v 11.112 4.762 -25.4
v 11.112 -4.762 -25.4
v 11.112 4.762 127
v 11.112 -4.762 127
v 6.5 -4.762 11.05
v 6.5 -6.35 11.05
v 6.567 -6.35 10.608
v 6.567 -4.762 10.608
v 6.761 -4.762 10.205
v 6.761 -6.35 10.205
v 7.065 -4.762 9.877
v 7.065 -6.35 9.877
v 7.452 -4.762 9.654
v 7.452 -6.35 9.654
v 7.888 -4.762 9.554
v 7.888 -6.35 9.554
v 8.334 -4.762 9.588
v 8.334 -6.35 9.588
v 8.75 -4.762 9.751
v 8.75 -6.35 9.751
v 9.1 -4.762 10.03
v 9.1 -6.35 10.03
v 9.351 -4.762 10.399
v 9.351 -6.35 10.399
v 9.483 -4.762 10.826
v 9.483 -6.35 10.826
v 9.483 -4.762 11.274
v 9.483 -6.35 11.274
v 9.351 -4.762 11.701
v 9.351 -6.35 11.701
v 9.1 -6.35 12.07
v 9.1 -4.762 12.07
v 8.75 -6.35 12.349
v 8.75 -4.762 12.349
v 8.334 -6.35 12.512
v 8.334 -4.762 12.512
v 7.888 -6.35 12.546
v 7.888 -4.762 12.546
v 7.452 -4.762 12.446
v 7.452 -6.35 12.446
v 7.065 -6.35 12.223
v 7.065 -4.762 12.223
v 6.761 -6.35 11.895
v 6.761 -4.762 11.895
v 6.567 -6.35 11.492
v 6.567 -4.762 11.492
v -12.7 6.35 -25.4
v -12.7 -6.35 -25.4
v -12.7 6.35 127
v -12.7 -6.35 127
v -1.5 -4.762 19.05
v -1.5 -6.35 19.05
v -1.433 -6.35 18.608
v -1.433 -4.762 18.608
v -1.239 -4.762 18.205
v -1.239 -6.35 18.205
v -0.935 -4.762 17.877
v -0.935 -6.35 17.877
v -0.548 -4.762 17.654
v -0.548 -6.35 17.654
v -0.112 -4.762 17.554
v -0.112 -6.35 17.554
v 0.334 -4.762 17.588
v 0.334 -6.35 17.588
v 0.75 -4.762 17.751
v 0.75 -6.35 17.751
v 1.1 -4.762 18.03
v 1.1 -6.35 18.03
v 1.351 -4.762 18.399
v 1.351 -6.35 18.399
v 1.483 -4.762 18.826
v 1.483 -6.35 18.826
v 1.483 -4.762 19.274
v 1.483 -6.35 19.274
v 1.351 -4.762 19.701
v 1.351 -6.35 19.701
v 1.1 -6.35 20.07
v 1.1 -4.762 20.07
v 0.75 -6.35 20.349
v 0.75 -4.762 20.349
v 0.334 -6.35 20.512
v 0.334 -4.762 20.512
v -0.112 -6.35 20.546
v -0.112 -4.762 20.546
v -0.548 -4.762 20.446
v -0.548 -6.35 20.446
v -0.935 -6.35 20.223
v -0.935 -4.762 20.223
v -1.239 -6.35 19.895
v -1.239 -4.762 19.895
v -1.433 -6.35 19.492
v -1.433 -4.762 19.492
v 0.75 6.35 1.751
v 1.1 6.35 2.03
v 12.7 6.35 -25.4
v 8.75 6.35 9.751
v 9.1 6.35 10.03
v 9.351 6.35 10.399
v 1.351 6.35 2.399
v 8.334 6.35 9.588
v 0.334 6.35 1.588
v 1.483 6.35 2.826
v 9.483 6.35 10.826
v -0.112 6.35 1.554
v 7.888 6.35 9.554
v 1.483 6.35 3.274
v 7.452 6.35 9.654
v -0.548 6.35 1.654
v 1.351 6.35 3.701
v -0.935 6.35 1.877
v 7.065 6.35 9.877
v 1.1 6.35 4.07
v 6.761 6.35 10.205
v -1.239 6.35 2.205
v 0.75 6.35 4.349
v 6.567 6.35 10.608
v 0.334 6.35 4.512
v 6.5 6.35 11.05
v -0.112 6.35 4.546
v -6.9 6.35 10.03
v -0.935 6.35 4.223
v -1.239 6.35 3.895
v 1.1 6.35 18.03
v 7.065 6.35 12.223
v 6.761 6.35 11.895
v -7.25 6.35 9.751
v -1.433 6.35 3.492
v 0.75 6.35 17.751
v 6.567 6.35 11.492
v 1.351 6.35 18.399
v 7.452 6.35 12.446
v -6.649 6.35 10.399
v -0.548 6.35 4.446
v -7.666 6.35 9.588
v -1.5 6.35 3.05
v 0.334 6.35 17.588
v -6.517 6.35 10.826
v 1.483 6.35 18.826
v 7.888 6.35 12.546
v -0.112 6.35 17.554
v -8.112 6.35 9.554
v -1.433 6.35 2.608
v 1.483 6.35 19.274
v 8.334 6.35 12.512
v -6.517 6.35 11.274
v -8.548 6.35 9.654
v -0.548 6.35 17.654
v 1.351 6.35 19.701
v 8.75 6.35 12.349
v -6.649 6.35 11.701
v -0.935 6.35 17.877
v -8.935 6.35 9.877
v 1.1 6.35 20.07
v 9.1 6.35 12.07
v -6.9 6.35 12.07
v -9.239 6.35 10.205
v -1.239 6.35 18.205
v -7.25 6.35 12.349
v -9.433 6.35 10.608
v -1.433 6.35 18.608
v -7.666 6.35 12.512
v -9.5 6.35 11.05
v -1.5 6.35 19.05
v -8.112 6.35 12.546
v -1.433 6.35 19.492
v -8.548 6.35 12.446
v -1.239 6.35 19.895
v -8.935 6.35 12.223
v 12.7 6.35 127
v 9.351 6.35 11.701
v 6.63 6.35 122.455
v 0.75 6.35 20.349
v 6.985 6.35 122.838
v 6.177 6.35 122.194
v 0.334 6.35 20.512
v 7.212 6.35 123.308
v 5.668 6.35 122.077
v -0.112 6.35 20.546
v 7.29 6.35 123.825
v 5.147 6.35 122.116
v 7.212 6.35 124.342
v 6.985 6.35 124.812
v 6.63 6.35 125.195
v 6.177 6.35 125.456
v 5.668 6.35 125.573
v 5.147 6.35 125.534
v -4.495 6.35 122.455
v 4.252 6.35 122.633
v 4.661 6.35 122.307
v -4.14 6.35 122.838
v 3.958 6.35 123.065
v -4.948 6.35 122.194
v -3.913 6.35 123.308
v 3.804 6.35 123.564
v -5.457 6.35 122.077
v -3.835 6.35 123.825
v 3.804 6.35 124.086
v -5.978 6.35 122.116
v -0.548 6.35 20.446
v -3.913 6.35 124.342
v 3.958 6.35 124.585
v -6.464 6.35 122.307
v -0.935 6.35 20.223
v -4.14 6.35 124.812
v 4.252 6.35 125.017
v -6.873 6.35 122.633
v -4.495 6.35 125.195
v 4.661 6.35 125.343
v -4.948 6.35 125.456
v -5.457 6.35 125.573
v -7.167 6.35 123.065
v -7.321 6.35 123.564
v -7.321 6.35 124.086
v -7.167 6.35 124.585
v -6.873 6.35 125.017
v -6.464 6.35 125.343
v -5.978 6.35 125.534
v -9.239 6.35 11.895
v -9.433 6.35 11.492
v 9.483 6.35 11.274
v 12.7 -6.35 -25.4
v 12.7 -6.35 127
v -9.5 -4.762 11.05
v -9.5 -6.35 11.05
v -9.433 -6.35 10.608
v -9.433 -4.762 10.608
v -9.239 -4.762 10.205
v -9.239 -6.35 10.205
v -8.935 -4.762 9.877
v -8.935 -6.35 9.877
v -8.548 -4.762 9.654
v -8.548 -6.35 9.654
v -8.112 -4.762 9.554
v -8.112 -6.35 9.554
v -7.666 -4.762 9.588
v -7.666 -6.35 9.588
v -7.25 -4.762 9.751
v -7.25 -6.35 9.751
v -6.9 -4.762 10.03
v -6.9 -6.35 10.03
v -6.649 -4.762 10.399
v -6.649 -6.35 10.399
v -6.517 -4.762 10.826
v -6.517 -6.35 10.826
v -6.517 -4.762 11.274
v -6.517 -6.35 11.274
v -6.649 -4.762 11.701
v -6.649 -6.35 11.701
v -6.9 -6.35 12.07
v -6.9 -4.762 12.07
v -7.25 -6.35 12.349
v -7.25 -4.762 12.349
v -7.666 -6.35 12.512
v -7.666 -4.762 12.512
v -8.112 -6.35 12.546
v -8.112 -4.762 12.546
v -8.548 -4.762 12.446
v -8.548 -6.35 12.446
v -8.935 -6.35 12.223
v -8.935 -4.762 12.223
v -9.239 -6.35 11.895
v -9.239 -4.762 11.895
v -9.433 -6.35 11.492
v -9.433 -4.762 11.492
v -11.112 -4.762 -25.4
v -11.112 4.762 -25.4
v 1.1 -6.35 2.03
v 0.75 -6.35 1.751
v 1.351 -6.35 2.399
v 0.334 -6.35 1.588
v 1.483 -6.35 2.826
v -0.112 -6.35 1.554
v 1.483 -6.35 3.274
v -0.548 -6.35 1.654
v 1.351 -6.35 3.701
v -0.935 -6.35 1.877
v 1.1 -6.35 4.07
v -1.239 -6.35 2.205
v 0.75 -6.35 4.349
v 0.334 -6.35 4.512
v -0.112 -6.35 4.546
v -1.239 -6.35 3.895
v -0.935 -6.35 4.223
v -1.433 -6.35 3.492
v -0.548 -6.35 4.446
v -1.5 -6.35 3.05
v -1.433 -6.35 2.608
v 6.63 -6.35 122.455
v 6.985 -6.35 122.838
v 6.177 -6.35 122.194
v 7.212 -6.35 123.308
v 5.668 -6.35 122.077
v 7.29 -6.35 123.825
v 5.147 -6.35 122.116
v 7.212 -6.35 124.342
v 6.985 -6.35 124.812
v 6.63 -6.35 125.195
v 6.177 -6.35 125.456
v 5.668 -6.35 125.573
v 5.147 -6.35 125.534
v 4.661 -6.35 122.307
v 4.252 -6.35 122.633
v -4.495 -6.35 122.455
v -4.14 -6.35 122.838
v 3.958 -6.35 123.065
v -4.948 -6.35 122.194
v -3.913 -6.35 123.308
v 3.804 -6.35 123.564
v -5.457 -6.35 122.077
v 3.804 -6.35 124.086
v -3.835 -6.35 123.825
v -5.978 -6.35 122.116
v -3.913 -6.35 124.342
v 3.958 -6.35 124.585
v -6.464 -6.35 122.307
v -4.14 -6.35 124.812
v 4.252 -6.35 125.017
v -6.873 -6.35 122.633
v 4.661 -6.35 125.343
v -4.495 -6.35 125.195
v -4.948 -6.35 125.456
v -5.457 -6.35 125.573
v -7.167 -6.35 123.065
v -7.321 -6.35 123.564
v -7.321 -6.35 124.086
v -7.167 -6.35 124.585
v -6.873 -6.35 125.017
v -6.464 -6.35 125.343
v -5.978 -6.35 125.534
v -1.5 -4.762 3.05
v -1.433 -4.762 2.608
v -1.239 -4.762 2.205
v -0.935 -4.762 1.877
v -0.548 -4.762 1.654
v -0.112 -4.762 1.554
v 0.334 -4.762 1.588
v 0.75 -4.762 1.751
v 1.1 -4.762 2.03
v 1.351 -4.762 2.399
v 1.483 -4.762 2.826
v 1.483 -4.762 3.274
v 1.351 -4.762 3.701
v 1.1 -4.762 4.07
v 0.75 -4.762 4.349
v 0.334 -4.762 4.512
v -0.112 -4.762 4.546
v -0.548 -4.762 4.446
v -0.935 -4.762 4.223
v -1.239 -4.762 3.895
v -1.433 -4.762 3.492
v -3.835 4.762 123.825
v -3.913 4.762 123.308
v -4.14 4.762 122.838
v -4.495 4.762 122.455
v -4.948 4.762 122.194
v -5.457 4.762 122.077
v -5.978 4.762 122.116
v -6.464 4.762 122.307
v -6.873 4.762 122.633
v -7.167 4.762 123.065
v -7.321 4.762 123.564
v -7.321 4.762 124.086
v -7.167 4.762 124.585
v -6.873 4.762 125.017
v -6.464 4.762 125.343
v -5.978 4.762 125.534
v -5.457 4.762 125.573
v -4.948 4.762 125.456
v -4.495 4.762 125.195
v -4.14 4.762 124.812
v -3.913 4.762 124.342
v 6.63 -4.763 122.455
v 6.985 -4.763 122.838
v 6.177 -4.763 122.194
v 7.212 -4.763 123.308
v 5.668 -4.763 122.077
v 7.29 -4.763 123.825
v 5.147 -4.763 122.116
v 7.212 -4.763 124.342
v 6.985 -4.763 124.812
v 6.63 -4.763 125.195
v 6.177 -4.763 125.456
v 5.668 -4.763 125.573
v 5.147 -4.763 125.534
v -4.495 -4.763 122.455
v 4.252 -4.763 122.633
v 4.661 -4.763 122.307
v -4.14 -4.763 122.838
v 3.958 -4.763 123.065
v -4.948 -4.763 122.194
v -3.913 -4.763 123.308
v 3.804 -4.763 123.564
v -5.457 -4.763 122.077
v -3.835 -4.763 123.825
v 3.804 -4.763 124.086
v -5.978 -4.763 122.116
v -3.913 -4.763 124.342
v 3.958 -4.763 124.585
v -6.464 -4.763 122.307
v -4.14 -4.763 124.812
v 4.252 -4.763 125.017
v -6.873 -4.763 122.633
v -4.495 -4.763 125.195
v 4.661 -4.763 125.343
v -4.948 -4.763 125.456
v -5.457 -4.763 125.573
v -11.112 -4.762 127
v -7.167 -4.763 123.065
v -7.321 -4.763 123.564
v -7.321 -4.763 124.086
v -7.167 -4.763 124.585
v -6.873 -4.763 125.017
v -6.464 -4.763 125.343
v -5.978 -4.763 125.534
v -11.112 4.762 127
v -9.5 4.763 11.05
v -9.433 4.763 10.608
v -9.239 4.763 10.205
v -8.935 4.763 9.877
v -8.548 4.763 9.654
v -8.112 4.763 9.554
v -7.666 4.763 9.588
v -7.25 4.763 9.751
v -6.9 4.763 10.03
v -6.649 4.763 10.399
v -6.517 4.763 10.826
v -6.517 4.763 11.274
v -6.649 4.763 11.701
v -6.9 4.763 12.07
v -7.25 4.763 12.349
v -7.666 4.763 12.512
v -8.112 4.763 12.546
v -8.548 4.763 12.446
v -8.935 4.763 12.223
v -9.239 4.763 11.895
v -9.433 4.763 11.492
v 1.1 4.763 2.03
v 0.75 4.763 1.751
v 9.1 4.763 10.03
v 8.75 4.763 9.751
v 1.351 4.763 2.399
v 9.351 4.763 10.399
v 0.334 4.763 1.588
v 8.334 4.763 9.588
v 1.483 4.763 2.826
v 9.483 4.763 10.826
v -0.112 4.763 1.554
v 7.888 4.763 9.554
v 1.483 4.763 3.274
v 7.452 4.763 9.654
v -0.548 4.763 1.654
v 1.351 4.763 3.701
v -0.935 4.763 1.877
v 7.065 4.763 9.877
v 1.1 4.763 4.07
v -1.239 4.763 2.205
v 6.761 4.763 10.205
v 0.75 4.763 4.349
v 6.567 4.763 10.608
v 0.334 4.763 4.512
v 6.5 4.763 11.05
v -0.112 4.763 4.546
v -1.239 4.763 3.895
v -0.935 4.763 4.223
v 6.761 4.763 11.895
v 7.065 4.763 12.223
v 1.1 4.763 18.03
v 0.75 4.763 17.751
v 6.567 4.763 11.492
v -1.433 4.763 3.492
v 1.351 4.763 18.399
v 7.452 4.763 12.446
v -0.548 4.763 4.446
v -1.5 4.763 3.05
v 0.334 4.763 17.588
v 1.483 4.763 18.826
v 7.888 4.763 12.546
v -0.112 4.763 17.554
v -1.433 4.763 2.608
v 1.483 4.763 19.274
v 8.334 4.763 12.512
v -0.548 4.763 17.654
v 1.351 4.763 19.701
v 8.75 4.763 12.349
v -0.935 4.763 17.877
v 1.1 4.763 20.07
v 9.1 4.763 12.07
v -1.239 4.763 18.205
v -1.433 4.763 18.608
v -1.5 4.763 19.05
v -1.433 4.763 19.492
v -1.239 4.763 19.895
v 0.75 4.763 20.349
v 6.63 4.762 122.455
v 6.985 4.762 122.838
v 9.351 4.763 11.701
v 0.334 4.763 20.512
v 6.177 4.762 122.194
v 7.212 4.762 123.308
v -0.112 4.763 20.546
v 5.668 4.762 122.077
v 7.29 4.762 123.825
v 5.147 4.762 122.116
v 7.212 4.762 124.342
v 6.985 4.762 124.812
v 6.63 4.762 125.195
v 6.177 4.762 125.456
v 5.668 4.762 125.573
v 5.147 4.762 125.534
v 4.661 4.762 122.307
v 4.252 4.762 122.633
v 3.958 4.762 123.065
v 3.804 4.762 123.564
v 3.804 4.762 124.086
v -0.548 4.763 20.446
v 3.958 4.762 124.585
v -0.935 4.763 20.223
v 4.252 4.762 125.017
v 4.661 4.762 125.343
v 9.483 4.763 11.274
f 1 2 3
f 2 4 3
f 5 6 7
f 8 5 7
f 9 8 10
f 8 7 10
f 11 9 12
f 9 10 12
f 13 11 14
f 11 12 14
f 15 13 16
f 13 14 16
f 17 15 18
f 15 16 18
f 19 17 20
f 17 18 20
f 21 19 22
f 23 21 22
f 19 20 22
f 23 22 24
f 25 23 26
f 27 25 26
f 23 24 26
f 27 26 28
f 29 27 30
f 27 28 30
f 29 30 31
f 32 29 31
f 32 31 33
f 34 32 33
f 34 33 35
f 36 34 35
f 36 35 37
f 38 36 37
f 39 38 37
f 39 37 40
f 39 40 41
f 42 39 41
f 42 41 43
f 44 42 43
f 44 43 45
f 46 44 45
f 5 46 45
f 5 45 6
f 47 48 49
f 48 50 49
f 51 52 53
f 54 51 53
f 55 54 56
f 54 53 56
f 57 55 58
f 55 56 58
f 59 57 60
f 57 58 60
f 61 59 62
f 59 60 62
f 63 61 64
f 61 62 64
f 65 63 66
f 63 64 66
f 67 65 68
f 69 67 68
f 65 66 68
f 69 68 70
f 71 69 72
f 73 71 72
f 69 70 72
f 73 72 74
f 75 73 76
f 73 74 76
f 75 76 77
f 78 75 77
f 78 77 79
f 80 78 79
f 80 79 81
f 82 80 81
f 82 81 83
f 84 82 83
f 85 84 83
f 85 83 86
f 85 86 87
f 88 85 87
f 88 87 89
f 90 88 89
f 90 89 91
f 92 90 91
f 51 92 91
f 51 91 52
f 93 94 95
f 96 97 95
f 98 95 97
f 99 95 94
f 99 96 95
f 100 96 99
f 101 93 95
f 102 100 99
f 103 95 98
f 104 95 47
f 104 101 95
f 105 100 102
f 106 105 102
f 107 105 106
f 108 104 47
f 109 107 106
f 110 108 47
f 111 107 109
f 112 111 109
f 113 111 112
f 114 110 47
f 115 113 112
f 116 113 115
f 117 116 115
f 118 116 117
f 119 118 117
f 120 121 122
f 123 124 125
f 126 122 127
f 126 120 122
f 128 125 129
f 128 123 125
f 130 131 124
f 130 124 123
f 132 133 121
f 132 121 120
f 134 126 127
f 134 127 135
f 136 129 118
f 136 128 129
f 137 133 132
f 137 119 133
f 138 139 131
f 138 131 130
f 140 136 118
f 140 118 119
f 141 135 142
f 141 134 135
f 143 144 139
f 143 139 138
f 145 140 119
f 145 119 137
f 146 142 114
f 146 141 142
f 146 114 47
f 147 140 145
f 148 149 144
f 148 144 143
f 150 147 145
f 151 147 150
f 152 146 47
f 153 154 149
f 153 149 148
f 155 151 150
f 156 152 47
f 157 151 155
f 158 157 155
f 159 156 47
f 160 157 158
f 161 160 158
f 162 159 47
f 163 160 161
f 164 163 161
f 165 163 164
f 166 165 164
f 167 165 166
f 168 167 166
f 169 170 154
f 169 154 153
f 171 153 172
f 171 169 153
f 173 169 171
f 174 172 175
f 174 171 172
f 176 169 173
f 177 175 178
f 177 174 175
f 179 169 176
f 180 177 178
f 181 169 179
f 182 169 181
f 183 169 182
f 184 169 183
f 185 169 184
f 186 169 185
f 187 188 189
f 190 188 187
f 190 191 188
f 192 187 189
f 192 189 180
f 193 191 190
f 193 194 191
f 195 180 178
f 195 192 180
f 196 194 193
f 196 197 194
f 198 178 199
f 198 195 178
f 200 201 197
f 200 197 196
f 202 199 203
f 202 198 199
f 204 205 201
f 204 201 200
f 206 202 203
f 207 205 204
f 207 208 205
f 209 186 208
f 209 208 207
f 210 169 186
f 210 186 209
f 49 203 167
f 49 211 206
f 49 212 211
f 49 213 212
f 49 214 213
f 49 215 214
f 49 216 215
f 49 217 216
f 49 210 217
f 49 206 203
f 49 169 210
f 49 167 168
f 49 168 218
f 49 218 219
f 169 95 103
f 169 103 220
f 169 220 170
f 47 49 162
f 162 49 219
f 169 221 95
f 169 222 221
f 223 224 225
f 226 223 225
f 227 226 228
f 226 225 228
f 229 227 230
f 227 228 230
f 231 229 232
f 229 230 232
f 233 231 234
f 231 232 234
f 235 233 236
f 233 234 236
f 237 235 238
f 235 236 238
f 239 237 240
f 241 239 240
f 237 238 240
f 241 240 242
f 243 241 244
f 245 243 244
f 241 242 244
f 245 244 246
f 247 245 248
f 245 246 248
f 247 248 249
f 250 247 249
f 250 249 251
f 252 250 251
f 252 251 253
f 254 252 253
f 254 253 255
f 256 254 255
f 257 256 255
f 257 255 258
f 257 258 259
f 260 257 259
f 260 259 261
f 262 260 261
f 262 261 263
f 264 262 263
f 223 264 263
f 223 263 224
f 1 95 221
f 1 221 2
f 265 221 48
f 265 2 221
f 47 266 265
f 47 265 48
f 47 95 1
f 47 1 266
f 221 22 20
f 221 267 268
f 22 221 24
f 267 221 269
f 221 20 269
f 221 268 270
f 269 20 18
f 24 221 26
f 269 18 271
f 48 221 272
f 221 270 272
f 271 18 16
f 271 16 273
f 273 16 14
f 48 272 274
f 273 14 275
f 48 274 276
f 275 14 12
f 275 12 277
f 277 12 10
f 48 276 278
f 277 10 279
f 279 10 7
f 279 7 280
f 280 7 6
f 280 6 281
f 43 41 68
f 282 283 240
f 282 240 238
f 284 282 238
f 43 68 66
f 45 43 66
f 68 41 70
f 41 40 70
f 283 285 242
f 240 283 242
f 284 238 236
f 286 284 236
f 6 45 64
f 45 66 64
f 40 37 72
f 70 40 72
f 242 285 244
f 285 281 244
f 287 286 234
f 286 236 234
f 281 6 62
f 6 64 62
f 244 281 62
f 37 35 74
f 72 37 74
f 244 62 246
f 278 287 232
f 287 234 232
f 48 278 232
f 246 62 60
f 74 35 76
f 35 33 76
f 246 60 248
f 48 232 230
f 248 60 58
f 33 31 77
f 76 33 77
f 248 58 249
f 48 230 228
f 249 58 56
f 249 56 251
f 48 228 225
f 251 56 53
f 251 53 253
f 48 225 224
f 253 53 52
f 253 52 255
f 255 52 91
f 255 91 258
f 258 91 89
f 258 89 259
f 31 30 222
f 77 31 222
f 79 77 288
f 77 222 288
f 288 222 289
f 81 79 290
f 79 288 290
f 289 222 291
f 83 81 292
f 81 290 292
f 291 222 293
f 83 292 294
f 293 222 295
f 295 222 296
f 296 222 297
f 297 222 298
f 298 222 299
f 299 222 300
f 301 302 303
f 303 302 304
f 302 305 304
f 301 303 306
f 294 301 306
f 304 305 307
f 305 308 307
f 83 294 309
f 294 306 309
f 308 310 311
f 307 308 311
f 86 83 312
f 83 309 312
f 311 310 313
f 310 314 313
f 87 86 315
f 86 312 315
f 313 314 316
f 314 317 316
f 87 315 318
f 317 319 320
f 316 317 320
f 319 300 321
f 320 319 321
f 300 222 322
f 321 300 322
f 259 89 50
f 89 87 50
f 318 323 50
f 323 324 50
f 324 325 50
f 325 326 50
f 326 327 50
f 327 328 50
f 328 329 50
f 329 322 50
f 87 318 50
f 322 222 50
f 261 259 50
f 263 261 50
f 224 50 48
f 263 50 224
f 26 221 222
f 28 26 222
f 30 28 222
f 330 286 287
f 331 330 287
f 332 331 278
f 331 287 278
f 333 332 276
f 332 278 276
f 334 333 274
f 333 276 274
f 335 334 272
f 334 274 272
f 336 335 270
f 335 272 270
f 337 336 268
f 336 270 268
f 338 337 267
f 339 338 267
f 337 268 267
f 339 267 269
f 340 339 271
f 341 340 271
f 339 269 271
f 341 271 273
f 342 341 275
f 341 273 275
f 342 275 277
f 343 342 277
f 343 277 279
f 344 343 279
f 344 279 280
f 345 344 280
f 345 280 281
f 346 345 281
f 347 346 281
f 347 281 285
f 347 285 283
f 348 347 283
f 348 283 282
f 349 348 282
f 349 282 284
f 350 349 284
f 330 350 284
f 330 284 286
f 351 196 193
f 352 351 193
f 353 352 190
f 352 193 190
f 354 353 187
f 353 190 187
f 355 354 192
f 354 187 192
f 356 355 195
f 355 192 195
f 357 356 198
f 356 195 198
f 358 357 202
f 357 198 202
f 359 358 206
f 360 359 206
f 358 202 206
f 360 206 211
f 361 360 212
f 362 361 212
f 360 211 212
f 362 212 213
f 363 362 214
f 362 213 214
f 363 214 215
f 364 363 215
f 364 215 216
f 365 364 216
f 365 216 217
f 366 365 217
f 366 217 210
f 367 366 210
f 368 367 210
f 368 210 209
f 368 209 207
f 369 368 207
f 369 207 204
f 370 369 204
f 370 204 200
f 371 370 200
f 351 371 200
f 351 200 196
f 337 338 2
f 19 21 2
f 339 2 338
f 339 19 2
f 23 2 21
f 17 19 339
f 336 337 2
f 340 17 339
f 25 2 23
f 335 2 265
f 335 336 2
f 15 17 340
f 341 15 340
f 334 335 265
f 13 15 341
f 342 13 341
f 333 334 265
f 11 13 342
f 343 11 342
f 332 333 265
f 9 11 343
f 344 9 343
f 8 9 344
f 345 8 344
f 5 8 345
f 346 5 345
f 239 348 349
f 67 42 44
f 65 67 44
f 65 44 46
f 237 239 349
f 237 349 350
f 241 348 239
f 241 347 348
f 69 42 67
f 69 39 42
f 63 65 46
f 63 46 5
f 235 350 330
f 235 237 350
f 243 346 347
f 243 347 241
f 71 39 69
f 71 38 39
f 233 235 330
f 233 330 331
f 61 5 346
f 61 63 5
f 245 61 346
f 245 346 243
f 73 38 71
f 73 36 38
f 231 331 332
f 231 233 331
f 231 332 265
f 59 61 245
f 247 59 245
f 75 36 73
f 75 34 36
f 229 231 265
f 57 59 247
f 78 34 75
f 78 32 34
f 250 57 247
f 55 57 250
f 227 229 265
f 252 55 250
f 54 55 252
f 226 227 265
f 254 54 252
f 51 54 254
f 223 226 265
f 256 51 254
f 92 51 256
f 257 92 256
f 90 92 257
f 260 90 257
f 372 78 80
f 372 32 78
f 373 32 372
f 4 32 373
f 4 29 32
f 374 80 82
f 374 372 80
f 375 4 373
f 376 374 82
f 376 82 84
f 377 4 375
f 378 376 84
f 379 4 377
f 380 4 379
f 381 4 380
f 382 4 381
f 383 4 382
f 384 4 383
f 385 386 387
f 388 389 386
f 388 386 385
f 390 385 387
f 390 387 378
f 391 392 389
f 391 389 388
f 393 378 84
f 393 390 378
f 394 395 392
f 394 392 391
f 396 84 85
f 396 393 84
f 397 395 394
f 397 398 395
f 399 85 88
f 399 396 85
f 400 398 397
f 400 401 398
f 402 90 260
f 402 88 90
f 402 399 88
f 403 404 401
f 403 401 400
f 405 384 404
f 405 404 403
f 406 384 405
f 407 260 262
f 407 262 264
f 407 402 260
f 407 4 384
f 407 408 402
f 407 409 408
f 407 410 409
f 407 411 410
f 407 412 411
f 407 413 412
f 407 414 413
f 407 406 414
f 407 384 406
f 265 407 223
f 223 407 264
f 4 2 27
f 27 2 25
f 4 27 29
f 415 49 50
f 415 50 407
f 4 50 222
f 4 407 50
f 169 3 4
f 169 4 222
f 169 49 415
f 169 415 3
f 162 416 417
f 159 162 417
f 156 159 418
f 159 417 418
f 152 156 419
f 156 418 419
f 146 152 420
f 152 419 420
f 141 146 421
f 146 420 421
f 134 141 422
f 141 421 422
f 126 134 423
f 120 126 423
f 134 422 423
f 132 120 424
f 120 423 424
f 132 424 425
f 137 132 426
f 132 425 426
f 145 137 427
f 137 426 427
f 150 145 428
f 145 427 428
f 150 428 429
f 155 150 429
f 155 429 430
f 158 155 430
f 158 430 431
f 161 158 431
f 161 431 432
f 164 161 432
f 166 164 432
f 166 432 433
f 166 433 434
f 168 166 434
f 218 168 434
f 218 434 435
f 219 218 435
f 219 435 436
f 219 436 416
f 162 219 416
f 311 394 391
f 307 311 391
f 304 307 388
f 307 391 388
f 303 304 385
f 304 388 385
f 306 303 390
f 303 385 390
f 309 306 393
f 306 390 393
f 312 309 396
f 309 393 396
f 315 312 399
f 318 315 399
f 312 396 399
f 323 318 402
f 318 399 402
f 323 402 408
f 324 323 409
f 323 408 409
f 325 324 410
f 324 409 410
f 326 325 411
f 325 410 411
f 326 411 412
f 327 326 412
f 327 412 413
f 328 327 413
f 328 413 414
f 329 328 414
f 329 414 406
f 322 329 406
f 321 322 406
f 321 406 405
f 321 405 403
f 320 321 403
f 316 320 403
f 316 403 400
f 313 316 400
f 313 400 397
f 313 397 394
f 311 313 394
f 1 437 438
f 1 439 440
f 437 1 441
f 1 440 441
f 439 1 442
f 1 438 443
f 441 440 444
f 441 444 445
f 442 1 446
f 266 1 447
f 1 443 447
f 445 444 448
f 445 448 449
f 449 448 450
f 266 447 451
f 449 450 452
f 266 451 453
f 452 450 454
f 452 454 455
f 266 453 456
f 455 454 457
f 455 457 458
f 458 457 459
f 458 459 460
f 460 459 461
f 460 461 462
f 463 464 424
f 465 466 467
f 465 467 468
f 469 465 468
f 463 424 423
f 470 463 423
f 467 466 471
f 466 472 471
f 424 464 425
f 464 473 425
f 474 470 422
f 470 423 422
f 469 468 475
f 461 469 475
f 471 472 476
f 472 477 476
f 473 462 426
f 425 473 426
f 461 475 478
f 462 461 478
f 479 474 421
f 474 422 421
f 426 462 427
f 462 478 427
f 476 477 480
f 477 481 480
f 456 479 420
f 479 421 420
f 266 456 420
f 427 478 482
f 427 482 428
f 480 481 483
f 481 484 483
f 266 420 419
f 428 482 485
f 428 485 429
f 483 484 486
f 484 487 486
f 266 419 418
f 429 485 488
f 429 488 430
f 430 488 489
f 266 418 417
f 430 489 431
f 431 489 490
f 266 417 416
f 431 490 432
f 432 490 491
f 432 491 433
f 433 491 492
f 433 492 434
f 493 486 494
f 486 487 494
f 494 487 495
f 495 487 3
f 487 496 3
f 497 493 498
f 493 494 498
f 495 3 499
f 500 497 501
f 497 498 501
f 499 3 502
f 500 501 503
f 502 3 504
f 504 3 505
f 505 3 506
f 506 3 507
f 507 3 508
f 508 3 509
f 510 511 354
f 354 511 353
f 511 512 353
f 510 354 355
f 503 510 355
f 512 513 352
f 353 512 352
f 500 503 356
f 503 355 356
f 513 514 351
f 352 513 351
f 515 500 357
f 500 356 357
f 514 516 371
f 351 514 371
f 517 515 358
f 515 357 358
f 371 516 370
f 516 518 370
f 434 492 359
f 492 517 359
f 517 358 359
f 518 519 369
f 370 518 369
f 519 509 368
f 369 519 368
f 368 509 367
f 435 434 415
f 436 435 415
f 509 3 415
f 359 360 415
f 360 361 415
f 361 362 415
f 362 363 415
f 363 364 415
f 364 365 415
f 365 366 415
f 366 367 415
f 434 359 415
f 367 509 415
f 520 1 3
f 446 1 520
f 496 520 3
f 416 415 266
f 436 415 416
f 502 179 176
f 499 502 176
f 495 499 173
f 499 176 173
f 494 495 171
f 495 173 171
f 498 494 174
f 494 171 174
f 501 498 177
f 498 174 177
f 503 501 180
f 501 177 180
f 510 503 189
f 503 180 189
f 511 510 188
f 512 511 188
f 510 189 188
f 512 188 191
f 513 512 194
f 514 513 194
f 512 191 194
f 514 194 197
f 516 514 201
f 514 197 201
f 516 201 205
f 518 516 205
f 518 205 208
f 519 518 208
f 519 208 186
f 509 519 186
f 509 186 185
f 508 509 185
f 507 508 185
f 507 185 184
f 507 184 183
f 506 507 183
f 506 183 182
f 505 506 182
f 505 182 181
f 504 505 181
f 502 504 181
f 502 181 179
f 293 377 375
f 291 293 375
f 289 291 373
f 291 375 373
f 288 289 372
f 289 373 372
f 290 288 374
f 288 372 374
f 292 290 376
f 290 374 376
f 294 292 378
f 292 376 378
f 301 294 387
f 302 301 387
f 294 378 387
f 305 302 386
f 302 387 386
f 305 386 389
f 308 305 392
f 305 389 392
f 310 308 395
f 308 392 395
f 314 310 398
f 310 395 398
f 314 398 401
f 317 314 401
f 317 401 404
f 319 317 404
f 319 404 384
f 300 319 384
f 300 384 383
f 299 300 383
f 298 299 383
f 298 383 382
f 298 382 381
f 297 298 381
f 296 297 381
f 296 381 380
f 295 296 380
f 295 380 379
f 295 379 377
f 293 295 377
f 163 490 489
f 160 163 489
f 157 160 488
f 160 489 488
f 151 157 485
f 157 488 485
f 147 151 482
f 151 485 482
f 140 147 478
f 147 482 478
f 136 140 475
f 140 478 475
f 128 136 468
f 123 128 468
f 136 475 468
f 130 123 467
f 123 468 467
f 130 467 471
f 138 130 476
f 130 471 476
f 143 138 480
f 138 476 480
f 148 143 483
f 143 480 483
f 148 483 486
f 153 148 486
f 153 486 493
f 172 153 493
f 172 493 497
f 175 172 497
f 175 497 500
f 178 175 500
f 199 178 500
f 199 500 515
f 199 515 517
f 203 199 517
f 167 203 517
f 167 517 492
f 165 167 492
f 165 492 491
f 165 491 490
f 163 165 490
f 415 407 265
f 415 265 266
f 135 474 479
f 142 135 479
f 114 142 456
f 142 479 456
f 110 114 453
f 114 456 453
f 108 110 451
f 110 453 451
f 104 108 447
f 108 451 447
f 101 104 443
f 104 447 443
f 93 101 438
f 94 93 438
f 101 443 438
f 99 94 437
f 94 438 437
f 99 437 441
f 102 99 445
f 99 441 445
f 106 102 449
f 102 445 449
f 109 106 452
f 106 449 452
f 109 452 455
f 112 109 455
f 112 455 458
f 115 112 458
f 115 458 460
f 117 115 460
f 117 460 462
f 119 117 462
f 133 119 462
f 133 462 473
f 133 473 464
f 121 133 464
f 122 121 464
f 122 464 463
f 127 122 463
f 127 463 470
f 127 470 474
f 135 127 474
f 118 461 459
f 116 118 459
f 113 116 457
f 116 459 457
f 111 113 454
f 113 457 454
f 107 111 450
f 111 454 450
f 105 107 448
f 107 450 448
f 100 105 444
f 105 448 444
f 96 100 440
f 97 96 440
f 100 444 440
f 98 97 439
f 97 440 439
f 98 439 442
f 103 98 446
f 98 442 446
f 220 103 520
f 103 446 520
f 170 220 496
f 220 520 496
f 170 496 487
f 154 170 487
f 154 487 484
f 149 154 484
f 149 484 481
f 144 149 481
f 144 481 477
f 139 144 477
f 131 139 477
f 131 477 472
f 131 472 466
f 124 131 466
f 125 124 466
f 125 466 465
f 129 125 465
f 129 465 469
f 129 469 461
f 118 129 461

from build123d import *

# Parameters (mm, degrees)
SKETCH1_W               = 25.4
SKETCH1_H               = 12.7
BOSS_EXTRUDE1_DEPTH     = 127
SKETCH4_W               = 22.225
SKETCH4_H               = 9.525
CUT_EXTRUDE1_DEPTH      = 128
SKETCH5_R               = 1.7526
CUT_EXTRUDE2_DEPTH      = 1
CUT_EXTRUDE2_DEPTH_BACK = 13.7
SKETCH6_R               = 1.5
CUT_EXTRUDE3_DEPTH      = 1
CUT_EXTRUDE3_DEPTH_BACK = 13.7
SKETCH7_W               = 25.4
SKETCH7_H               = 12.7
SKETCH7_W_2             = 22.225
SKETCH7_H_2             = 9.525
BOSS_EXTRUDE2_DEPTH     = 25.4


with BuildPart() as part:
    # Sketch1 → Boss-Extrude1 (new body)
    with BuildSketch(Plane.XY):
        Rectangle(SKETCH1_W, SKETCH1_H)
    extrude(amount=BOSS_EXTRUDE1_DEPTH)

    # Sketch4 → Cut-Extrude1 (cut, through all)
    with BuildSketch(Plane(origin=(0, 0, 0), x_dir=(-1, 0, 0), z_dir=(0, 0, -1))):
        Rectangle(SKETCH4_W, SKETCH4_H)
    extrude(amount=-CUT_EXTRUDE1_DEPTH, mode=Mode.SUBTRACT)

    # Sketch5 → Cut-Extrude2 (cut, two sides)
    with BuildSketch(Plane(origin=(0, 6.35, 0), x_dir=(1, 0, 0), z_dir=(0, 1, 0))) as cut_extrude2_sk:
        with Locations((-5.588, -123.825)):
            Circle(SKETCH5_R)
        with Locations((5.5372, -123.825)):
            Circle(SKETCH5_R)
    extrude(amount=CUT_EXTRUDE2_DEPTH, mode=Mode.SUBTRACT)
    extrude(cut_extrude2_sk.sketch, amount=-CUT_EXTRUDE2_DEPTH_BACK, mode=Mode.SUBTRACT)

    # Sketch6 → Cut-Extrude3 (cut, two sides)
    with BuildSketch(Plane(origin=(0, -6.35, 0), x_dir=(-1, 0, 0), z_dir=(0, -1, 0))) as cut_extrude3_sk:
        with Locations((8, -11.05)):
            Circle(SKETCH6_R)
        with Locations((-8, -11.05)):
            Circle(SKETCH6_R)
        with Locations((0, -3.05)):
            Circle(SKETCH6_R)
        with Locations((0, -19.05)):
            Circle(SKETCH6_R)
    extrude(amount=CUT_EXTRUDE3_DEPTH, mode=Mode.SUBTRACT)
    extrude(cut_extrude3_sk.sketch, amount=-CUT_EXTRUDE3_DEPTH_BACK, mode=Mode.SUBTRACT)

    # Sketch7 → Boss-Extrude2 (add)
    with BuildSketch(Plane(origin=(0, 0, 0), x_dir=(-1, 0, 0), z_dir=(0, 0, -1))):
        Rectangle(SKETCH7_W, SKETCH7_H)
        Rectangle(SKETCH7_W_2, SKETCH7_H_2, mode=Mode.SUBTRACT)
    extrude(amount=BOSS_EXTRUDE2_DEPTH)


solid = part.part
